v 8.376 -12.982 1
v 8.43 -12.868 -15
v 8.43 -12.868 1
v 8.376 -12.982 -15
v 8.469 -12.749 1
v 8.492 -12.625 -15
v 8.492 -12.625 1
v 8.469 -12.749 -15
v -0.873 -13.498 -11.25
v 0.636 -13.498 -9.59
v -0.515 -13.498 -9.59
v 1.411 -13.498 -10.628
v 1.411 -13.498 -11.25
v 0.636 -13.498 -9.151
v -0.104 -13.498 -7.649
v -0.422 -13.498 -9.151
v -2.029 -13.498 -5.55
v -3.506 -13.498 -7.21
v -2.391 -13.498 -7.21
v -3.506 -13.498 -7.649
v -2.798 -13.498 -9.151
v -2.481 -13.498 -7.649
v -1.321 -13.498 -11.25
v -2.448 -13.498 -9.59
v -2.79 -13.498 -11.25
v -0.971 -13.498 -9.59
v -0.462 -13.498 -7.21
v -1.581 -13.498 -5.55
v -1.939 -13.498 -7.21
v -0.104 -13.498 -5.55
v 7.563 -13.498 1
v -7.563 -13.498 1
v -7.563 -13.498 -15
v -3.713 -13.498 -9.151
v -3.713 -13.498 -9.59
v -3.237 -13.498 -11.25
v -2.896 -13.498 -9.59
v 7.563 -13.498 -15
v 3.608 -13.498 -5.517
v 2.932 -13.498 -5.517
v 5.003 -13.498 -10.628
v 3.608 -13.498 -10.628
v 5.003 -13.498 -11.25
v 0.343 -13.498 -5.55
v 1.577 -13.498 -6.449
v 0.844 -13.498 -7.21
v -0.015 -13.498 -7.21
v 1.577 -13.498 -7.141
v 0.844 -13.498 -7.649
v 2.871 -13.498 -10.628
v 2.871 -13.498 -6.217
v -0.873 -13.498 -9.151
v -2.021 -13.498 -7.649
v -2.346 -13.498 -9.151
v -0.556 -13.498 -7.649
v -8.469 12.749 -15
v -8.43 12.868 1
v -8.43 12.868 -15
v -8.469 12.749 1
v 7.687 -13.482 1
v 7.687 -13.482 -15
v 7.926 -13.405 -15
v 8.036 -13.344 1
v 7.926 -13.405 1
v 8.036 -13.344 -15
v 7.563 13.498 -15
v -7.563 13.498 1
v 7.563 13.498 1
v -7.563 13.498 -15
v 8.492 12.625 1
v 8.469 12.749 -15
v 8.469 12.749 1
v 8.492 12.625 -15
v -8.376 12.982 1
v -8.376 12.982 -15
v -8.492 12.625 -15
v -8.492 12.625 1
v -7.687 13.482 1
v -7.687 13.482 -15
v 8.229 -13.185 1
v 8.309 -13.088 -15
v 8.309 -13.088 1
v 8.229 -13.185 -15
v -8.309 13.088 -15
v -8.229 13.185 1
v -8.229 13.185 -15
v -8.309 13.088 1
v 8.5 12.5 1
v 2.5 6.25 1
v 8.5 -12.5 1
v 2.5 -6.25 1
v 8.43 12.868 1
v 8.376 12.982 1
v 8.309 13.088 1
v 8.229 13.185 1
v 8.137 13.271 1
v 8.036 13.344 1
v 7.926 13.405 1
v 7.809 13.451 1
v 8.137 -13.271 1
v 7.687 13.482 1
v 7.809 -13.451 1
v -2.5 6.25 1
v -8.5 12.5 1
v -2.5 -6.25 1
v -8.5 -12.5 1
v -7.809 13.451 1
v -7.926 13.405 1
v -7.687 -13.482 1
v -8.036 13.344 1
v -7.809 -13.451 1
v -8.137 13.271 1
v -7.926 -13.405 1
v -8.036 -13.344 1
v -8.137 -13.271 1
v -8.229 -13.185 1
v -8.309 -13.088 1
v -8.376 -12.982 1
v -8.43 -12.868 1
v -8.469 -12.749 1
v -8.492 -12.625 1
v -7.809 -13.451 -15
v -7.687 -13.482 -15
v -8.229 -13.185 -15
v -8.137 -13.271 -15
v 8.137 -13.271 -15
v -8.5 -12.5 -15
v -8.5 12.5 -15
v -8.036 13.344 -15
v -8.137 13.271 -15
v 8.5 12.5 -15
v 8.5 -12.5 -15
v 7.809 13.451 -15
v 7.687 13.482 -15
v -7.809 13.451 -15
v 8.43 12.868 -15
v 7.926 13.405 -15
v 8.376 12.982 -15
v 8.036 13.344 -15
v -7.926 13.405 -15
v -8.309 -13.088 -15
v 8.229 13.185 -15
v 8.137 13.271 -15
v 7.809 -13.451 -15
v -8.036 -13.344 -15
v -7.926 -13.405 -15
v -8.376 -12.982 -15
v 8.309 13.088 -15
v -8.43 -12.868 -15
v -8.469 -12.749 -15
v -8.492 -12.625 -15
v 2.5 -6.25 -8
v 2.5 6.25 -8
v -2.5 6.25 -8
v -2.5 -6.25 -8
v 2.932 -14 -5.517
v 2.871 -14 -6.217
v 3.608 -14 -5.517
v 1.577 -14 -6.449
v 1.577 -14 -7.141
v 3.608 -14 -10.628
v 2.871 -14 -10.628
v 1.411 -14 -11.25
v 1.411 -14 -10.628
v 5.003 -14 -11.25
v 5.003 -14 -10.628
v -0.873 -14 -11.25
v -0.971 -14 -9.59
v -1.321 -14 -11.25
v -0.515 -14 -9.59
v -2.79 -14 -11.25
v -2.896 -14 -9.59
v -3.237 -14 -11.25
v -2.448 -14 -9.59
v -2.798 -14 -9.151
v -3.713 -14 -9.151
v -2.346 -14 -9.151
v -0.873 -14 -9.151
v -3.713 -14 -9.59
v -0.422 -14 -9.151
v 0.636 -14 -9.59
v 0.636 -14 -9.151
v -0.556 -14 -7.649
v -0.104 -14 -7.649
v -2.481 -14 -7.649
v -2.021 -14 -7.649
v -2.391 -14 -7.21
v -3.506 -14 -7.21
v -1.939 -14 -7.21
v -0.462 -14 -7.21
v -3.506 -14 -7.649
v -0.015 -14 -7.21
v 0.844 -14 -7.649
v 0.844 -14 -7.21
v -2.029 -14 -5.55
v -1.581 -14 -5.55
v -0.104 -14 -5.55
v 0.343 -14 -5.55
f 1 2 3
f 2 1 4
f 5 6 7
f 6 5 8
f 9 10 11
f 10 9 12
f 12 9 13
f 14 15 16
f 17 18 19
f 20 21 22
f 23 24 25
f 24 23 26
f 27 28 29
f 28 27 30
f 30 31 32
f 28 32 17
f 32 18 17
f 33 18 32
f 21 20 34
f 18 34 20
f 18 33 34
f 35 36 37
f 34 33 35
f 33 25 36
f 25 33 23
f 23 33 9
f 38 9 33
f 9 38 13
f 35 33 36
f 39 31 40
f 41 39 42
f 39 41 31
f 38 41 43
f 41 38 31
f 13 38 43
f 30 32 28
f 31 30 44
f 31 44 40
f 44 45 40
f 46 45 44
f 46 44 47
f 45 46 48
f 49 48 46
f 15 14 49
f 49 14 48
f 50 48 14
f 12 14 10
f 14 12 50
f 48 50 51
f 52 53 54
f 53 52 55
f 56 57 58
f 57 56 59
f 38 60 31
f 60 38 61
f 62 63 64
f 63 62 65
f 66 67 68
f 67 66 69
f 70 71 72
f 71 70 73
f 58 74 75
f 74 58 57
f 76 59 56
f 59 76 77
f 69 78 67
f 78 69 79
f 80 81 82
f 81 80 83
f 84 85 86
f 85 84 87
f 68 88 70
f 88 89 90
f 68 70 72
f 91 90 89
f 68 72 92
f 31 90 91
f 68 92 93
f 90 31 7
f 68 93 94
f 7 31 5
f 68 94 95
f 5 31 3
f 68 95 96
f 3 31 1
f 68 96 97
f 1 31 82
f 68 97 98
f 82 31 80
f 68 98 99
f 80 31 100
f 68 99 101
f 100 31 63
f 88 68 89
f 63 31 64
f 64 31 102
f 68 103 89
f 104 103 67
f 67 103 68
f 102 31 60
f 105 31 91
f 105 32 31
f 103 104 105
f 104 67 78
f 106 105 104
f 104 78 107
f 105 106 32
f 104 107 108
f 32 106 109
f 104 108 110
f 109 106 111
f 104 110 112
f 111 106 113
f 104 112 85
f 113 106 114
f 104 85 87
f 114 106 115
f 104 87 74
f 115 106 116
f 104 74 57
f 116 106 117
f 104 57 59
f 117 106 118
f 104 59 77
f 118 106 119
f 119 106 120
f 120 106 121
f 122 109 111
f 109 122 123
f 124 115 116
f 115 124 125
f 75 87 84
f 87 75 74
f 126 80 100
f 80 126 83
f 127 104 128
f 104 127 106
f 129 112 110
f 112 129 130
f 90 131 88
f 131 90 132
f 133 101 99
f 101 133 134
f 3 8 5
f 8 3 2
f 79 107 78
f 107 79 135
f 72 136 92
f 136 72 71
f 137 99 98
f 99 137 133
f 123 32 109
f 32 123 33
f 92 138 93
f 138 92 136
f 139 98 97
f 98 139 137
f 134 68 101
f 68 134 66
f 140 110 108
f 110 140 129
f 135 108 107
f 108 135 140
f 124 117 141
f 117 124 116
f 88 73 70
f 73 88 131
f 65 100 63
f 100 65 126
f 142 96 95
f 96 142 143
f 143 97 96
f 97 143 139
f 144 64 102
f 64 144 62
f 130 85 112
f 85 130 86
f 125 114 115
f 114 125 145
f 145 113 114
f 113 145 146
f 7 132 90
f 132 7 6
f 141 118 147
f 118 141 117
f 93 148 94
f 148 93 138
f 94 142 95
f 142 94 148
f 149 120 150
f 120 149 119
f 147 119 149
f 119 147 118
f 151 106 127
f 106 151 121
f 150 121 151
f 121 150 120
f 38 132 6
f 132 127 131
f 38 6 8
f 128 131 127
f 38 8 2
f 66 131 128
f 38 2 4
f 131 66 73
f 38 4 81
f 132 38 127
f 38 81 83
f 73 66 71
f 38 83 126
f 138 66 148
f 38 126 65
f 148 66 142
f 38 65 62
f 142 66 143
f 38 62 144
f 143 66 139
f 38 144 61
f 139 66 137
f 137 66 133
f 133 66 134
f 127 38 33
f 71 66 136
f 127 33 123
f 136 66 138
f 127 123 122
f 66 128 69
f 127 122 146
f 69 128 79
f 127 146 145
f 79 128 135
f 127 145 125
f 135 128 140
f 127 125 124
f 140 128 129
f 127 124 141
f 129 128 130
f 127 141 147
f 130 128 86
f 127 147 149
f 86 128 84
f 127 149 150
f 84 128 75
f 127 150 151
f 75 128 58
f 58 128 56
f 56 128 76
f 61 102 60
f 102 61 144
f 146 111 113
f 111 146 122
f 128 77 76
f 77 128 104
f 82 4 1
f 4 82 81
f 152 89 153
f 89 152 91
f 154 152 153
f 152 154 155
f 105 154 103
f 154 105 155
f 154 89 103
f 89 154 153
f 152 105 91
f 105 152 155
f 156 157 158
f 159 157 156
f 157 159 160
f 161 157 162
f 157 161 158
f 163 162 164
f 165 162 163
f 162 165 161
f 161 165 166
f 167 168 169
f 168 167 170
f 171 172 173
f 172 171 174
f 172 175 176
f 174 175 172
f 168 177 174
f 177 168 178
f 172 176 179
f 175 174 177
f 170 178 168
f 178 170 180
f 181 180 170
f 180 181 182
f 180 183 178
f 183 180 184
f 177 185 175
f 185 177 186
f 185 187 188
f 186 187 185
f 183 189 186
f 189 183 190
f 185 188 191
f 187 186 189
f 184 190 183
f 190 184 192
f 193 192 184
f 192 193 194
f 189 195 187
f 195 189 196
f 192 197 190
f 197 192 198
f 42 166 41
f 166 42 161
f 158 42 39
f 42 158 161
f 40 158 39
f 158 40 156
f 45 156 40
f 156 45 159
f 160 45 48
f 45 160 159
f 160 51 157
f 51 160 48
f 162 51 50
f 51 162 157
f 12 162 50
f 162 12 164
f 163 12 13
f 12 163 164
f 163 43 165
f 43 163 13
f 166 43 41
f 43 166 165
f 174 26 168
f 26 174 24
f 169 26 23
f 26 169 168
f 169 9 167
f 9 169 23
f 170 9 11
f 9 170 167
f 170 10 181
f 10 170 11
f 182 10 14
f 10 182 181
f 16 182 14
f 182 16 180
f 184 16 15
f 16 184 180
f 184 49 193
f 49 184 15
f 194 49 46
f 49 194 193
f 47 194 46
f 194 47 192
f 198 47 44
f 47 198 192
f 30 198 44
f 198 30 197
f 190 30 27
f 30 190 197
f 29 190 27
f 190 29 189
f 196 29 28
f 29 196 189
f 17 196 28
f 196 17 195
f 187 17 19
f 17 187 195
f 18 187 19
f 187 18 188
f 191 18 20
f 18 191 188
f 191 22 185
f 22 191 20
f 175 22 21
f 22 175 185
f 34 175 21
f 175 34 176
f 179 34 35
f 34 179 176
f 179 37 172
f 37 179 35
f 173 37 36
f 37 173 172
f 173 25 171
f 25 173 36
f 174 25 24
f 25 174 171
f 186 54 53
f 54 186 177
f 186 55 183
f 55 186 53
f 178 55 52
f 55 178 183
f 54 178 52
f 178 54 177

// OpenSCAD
width = 15;
depth = 25;
height = 15;

cut_width = 5;
cut_depth = 12.5;
cut_height = 20;

module usb_holder(x=0, y=0) {
  translate([x, y, 0]) {
    difference() {
      translate([-width/2, -depth/2, 0]) {
	minkowski() {
	  cube([width, depth, height], center = true);
	  translate([width/2, depth/2, -height/2]) {
	    cylinder(1, $fn=50);
	  }
	}
      }

      translate([0, 0, 2]) {
          cube([cut_width, cut_depth, cut_height], center = true);
      }
    }
  }
}


for (i = [0:0])
  usb_holder(width * i);

translate([-width/4, -depth/2, -3*height/4])
rotate(a = [-270, 0, 0])
linear_extrude(3, center=true)
text("#1", size=6);
